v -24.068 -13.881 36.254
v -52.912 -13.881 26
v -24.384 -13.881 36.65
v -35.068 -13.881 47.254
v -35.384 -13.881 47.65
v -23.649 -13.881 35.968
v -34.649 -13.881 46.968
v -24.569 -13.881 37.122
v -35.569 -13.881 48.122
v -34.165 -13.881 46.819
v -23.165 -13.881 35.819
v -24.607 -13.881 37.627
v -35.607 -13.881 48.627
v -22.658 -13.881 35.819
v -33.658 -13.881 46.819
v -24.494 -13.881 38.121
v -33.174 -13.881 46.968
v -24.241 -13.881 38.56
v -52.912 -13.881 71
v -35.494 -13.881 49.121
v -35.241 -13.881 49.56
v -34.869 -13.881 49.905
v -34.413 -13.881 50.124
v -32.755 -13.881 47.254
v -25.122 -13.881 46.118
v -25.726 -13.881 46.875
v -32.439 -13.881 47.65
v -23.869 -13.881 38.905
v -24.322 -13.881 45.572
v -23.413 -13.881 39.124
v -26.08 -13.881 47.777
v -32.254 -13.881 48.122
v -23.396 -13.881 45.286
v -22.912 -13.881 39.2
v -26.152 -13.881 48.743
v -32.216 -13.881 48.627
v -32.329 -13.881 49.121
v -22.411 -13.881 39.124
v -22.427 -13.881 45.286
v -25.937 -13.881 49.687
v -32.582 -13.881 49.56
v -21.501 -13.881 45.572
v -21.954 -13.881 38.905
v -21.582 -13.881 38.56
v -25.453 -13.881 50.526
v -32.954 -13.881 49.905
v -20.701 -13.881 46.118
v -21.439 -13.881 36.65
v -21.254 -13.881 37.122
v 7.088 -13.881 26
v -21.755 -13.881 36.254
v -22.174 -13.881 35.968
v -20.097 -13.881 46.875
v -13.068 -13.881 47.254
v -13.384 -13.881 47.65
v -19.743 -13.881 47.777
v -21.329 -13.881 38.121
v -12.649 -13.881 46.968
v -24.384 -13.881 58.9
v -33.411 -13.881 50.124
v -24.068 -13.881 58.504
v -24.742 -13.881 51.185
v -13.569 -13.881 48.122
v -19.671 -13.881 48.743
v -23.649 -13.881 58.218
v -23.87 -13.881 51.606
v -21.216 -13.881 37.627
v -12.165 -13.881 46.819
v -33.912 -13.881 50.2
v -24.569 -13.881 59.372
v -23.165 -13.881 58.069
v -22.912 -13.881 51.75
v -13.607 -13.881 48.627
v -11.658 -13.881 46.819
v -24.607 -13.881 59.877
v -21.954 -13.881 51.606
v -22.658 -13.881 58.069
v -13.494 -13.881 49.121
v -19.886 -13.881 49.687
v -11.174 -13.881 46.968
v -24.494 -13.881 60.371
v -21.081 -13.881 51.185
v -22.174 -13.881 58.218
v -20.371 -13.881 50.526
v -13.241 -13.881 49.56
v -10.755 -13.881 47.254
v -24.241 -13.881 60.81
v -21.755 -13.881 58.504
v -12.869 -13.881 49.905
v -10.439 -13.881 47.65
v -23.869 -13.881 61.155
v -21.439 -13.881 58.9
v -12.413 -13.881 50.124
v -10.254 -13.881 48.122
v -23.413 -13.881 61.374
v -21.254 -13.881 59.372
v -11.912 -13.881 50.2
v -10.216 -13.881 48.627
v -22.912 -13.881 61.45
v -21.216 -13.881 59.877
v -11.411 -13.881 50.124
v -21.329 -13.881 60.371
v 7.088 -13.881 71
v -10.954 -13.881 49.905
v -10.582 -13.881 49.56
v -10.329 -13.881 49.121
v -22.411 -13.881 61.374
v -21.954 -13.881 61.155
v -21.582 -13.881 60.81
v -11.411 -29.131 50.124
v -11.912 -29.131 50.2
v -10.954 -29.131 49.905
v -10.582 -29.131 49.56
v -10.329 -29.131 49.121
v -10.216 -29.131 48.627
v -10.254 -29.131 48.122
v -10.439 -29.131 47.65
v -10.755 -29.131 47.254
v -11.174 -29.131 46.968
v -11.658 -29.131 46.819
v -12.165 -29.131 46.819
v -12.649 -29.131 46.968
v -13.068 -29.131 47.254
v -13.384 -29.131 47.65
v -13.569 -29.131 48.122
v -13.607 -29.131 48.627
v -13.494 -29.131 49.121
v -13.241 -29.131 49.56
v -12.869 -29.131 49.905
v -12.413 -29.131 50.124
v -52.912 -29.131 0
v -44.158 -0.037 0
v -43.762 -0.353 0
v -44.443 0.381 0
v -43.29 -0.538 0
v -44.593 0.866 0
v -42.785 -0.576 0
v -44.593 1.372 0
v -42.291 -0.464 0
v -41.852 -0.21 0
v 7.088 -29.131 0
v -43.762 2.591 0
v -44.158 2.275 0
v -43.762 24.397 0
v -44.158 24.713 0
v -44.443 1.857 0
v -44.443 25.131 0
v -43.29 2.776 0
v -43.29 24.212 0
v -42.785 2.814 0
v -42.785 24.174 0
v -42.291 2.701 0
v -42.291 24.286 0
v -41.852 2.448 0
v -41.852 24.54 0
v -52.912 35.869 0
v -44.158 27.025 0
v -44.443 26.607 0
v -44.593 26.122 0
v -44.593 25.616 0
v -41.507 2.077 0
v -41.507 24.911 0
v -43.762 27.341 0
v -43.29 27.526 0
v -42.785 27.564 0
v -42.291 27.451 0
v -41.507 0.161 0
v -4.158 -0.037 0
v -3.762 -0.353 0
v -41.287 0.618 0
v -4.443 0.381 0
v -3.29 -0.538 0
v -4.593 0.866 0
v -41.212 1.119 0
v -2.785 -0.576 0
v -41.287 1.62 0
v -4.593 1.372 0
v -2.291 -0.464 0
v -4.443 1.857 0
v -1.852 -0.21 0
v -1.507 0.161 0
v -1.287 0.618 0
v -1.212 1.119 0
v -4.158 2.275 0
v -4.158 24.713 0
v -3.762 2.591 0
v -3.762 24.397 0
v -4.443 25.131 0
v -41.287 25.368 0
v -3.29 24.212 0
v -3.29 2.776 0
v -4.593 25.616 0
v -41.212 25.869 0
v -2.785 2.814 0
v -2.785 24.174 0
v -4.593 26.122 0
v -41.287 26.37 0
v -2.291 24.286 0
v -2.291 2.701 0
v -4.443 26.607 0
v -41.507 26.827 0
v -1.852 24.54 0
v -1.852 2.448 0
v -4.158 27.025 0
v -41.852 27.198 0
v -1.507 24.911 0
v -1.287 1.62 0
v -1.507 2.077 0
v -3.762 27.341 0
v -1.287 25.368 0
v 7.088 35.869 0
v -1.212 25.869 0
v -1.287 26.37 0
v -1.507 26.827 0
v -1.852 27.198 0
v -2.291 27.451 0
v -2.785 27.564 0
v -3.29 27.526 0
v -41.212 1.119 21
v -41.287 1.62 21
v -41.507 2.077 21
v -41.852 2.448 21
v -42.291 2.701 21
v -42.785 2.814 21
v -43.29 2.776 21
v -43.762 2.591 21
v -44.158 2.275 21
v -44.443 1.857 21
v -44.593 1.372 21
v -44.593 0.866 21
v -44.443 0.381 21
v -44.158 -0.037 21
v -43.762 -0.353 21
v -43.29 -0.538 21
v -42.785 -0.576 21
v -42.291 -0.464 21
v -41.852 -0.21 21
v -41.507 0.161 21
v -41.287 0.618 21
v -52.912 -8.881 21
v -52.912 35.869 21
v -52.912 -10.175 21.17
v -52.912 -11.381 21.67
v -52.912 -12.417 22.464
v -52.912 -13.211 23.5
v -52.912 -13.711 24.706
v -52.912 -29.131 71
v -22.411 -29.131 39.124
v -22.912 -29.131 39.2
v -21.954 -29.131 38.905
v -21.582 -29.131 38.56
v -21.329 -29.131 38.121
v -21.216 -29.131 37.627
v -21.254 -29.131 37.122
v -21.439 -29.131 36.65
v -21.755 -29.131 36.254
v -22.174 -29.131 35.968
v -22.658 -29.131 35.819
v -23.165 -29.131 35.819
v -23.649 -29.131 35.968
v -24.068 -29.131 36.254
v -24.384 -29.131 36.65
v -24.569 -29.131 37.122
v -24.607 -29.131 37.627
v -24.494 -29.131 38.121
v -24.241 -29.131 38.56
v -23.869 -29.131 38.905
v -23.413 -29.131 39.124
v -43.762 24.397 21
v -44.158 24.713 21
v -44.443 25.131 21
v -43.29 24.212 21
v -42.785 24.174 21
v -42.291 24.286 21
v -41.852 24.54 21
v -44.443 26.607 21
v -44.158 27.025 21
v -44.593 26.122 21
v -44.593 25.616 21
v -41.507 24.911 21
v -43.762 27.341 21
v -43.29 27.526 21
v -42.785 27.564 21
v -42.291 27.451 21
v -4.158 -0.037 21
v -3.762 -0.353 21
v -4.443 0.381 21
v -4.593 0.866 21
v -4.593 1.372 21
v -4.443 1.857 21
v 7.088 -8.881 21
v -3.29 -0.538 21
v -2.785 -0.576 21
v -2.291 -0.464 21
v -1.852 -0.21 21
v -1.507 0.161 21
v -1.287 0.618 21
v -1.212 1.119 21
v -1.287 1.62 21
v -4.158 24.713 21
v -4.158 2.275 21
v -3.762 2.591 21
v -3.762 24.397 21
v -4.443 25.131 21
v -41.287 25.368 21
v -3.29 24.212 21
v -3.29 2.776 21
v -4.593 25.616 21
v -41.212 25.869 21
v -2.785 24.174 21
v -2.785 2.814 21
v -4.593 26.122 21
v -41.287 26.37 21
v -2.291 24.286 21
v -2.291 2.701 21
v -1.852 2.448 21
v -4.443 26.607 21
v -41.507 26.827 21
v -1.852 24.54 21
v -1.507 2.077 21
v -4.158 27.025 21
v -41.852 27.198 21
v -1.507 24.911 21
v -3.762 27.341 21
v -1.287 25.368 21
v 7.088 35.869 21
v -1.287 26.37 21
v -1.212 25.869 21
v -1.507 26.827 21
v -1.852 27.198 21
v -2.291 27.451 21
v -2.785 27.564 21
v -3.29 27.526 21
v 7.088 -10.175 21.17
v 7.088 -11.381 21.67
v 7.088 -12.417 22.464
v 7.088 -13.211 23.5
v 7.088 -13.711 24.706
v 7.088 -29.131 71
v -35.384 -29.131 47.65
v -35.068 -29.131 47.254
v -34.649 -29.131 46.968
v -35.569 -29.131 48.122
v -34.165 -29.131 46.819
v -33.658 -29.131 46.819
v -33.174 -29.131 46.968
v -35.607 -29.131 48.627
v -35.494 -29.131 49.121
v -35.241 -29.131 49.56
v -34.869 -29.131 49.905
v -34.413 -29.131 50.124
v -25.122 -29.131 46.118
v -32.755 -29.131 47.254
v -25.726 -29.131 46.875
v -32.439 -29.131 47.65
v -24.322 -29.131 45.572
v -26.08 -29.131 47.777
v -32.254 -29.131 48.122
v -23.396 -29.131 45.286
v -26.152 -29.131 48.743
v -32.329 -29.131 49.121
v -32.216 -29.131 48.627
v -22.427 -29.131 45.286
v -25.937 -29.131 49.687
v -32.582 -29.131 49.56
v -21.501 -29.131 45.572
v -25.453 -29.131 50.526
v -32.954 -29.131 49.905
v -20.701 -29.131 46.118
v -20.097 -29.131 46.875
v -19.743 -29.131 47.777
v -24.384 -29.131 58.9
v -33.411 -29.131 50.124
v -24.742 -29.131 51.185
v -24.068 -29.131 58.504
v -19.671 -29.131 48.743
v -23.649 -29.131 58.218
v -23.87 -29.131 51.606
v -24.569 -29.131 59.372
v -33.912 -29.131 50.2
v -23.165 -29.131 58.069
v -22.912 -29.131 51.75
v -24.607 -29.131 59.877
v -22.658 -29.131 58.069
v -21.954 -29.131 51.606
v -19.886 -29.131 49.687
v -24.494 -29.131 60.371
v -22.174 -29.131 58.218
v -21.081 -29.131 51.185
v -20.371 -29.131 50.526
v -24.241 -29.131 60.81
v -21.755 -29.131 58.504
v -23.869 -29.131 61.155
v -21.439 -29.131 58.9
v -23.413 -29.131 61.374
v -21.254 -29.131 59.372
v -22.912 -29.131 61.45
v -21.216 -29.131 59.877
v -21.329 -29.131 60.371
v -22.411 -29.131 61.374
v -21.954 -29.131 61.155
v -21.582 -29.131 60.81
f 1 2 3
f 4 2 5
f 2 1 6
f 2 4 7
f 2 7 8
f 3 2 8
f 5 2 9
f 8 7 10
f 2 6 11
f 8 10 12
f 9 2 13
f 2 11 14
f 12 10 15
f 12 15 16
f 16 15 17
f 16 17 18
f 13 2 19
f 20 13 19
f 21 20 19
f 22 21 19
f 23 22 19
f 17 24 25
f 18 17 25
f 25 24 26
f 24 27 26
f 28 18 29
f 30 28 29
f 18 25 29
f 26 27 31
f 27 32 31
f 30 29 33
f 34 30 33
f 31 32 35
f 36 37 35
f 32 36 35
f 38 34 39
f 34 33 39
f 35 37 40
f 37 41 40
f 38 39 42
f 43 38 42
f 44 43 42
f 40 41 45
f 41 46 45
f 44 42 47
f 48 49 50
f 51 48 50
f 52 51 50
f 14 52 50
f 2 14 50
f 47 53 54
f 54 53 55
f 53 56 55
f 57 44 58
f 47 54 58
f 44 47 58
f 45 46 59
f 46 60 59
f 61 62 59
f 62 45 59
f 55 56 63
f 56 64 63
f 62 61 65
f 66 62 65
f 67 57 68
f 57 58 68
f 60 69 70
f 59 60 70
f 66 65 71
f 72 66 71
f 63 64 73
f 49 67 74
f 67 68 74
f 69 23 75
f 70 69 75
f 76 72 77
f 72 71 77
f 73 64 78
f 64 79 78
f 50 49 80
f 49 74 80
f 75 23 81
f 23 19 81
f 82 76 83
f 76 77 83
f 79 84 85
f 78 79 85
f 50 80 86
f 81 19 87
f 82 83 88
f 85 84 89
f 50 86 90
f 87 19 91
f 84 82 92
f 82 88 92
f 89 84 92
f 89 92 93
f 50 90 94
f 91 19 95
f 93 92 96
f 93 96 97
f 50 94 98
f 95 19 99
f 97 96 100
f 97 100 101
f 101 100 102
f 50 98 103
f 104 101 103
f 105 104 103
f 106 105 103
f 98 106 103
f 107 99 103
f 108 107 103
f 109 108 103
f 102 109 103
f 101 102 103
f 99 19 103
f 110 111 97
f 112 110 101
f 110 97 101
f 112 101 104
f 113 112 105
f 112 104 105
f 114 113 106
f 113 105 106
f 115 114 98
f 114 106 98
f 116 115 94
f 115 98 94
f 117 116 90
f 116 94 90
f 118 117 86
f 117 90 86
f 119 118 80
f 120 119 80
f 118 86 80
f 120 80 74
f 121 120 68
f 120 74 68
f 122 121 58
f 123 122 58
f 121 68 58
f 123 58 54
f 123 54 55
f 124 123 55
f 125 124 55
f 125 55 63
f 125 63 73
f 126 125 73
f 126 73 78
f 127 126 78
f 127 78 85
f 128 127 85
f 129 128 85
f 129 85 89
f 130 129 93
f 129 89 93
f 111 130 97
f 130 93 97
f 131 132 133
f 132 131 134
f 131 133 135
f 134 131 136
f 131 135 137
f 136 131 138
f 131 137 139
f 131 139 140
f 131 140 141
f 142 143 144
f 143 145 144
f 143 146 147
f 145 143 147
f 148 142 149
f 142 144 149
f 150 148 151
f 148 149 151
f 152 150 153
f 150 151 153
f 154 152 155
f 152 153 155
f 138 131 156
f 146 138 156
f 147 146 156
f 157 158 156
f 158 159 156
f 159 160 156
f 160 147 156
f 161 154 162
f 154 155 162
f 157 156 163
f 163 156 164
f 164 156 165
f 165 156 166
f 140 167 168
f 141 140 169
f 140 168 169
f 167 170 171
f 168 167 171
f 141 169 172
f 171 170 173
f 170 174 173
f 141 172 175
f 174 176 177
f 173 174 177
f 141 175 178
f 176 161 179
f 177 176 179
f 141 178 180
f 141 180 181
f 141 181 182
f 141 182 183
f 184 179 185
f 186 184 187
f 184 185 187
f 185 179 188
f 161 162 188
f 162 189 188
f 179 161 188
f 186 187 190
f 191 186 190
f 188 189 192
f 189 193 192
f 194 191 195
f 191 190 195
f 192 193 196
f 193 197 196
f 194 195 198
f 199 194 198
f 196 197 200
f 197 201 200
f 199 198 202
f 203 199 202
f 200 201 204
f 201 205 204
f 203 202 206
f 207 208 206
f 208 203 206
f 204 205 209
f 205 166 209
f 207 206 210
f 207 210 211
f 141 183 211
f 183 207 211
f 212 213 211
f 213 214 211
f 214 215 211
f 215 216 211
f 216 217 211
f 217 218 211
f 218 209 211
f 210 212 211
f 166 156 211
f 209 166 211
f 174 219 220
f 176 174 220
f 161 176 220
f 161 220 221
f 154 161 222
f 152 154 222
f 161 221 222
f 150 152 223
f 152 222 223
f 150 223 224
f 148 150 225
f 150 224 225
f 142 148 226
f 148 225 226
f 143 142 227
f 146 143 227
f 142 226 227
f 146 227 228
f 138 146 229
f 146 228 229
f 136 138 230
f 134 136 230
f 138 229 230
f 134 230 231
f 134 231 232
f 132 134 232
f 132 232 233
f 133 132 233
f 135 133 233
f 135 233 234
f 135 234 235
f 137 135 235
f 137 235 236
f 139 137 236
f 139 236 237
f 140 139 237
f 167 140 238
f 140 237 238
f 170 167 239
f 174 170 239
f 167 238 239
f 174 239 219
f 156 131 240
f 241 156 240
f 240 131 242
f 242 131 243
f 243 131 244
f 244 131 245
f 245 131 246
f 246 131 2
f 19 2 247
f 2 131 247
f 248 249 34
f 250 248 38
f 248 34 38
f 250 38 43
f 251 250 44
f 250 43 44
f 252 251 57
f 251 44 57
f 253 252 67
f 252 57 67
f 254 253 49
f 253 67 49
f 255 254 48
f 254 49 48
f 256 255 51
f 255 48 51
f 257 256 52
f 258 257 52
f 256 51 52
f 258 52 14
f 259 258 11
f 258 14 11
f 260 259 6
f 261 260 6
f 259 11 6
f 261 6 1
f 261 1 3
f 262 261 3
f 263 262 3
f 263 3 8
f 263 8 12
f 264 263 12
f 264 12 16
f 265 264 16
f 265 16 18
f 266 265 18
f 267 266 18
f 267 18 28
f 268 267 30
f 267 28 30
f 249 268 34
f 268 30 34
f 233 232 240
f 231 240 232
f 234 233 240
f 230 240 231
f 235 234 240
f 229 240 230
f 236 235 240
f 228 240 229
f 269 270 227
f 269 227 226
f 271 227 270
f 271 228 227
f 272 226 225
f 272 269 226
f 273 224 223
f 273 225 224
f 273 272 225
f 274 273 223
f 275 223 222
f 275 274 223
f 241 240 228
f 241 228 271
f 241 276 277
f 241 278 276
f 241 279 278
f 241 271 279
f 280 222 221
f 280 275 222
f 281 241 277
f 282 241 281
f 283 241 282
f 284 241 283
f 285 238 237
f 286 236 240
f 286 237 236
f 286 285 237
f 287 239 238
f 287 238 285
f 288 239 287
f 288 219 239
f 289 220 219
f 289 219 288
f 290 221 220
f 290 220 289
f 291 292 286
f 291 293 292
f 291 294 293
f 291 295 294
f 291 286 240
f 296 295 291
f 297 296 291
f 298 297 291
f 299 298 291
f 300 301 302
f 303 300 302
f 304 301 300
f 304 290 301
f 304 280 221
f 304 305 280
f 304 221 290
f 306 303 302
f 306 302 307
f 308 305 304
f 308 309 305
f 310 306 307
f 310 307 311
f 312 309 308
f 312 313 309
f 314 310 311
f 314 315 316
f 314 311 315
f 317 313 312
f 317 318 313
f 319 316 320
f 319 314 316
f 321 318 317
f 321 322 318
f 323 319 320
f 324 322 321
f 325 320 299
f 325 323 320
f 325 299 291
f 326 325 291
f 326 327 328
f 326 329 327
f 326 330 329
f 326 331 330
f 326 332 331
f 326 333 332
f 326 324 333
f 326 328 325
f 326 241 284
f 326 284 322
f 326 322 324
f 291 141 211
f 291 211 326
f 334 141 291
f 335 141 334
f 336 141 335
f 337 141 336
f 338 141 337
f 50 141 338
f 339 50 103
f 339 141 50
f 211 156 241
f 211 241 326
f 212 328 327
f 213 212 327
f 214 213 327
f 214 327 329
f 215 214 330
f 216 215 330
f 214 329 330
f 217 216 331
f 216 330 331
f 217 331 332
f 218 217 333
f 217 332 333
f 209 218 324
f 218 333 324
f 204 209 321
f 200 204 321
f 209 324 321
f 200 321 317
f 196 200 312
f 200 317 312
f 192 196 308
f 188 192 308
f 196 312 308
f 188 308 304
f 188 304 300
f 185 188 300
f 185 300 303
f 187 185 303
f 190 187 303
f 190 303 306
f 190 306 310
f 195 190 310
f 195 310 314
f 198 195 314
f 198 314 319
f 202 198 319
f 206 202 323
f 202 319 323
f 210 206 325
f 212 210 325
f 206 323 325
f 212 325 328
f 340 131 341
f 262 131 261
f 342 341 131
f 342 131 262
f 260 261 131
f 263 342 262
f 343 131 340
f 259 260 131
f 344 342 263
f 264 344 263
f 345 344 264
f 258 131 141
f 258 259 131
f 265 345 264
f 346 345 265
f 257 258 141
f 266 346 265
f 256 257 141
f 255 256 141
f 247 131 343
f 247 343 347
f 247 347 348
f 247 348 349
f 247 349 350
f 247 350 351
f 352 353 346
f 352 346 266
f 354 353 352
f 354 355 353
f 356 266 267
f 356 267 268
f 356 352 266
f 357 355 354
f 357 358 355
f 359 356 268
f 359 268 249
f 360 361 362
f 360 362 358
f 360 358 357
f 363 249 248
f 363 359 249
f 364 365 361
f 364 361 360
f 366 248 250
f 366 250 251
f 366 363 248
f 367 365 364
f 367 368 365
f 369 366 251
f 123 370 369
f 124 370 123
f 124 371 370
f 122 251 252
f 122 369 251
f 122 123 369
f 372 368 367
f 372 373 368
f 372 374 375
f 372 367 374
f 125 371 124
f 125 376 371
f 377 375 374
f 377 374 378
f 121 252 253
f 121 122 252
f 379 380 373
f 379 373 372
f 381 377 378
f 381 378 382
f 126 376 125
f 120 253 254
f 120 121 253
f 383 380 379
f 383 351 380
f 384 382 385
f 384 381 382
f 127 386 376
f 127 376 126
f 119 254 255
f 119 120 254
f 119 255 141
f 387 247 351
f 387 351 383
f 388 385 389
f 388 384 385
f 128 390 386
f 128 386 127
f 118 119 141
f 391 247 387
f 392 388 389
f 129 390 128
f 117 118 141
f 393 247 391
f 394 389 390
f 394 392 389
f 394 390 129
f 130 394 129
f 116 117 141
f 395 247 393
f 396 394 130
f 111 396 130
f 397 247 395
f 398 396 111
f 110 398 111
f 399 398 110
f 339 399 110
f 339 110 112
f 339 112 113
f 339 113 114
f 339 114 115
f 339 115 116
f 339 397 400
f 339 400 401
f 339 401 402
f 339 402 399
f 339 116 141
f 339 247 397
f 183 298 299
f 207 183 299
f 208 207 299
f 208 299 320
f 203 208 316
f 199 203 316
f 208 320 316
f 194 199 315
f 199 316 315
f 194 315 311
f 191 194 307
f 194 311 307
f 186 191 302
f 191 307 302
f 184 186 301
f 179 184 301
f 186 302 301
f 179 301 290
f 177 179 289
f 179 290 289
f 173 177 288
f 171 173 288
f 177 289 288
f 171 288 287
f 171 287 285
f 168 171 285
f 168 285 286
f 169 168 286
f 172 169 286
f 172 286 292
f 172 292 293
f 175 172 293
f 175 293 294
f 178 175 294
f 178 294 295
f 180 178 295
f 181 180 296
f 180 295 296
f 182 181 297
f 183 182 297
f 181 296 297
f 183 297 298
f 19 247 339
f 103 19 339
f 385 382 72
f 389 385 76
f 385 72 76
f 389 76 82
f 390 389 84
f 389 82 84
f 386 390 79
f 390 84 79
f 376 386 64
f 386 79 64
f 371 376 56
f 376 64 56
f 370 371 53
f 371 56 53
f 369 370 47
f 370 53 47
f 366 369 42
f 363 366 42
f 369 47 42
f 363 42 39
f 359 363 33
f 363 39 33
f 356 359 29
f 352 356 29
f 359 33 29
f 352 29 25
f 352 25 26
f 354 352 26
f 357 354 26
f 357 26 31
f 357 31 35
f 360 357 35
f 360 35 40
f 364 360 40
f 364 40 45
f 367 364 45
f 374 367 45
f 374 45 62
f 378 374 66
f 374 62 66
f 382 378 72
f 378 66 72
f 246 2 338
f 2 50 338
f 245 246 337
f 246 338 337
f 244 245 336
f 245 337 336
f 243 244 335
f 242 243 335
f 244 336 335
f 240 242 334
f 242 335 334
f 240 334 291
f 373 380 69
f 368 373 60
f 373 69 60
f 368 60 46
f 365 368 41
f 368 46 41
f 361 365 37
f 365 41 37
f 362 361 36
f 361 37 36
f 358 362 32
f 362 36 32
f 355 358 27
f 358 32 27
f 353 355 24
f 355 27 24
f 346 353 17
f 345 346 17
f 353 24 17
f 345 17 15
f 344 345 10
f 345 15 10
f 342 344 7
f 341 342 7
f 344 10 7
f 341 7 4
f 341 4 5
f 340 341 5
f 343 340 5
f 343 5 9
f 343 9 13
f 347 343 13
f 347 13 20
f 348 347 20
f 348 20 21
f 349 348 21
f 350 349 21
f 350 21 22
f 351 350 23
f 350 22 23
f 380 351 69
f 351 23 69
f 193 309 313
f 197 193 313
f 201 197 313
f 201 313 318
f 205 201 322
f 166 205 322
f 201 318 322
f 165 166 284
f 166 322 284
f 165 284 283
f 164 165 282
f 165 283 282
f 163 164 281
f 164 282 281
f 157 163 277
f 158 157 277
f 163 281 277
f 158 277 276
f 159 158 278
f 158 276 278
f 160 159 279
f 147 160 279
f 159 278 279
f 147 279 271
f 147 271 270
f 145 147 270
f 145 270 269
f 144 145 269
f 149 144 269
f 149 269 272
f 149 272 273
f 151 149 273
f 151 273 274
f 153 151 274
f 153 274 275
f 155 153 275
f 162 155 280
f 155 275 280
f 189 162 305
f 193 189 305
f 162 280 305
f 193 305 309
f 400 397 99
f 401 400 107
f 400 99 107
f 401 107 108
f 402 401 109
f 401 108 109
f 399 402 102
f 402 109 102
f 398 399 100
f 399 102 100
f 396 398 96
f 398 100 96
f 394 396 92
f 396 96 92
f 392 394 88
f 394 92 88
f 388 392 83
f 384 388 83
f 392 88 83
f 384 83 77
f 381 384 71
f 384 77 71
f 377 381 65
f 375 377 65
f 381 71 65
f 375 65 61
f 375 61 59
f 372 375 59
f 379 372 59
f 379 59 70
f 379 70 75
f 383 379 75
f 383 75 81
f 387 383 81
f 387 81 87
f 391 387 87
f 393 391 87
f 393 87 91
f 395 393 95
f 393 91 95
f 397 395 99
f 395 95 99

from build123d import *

# Parameters (mm, degrees)
SKETCH1_W           = 60
SKETCH1_H           = 65
BOSS_EXTRUDE1_DEPTH = 21
SKETCH2_W           = 60
SKETCH2_H           = 50
BOSS_EXTRUDE2_DEPTH = 15.25
FILLET1_R           = 5
SKETCH3_R           = 3.25
SKETCH3_R_2         = 1.7
CUT_EXTRUDE4_DEPTH  = 15.25
SKETCH10_R          = 1.7
CUT_EXTRUDE5_DEPTH  = 21


with BuildPart() as part:
    # Sketch1 → Boss-Extrude1 (new body)
    with BuildSketch(Plane.XY):
        with Locations((-22.911585366, 3.368902439)):
            Rectangle(SKETCH1_W, SKETCH1_H)
    extrude(amount=BOSS_EXTRUDE1_DEPTH)

    # Sketch2 → Boss-Extrude2 (add)
    with BuildSketch(Plane.XZ.offset(29.131097561)):
        with Locations((-22.911585366, 46)):
            Rectangle(SKETCH2_W, SKETCH2_H)
    extrude(amount=-BOSS_EXTRUDE2_DEPTH)

    # Fillet1
    fillet1_edges = [part.edges().sort_by_distance(p)[0] for p in [
        (-22.911585366, -13.881097561, 21),
    ]]
    fillet(fillet1_edges, radius=FILLET1_R)

    # Sketch3 → Cut-Extrude4 (cut)
    with BuildSketch(Plane(origin=(0, -13.881097561, 0), x_dir=(1, 0, 0), z_dir=(0, 1, 0))):
        with Locations(Location((-22.911585366, -48.5, 0), (0, 0, 270))):
            Circle(SKETCH3_R)
        with Locations(Location((-11.911585366, -48.5, 0), (0, 0, 270))):
            Circle(SKETCH3_R_2)
        with Locations(Location((-22.911585366, -59.75, 0), (0, 0, 270))):
            Circle(SKETCH3_R_2)
        with Locations(Location((-33.911585366, -48.5, 0), (0, 0, 270))):
            Circle(SKETCH3_R_2)
        with Locations(Location((-22.911585366, -37.5, 0), (0, 0, 270))):
            Circle(SKETCH3_R_2)
    extrude(amount=-CUT_EXTRUDE4_DEPTH, mode=Mode.SUBTRACT)

    # Sketch10 → Cut-Extrude5 (cut)
    with BuildSketch(Plane.XY.offset(21)):
        with Locations((-2.911585366, 25.868902439)):
            Circle(SKETCH10_R)
        with Locations((-2.911585366, 1.118902439)):
            Circle(SKETCH10_R)
        with Locations((-42.911585366, 25.868902439)):
            Circle(SKETCH10_R)
        with Locations((-42.911585366, 1.118902439)):
            Circle(SKETCH10_R)
    extrude(amount=-CUT_EXTRUDE5_DEPTH, mode=Mode.SUBTRACT)


solid = part.part
